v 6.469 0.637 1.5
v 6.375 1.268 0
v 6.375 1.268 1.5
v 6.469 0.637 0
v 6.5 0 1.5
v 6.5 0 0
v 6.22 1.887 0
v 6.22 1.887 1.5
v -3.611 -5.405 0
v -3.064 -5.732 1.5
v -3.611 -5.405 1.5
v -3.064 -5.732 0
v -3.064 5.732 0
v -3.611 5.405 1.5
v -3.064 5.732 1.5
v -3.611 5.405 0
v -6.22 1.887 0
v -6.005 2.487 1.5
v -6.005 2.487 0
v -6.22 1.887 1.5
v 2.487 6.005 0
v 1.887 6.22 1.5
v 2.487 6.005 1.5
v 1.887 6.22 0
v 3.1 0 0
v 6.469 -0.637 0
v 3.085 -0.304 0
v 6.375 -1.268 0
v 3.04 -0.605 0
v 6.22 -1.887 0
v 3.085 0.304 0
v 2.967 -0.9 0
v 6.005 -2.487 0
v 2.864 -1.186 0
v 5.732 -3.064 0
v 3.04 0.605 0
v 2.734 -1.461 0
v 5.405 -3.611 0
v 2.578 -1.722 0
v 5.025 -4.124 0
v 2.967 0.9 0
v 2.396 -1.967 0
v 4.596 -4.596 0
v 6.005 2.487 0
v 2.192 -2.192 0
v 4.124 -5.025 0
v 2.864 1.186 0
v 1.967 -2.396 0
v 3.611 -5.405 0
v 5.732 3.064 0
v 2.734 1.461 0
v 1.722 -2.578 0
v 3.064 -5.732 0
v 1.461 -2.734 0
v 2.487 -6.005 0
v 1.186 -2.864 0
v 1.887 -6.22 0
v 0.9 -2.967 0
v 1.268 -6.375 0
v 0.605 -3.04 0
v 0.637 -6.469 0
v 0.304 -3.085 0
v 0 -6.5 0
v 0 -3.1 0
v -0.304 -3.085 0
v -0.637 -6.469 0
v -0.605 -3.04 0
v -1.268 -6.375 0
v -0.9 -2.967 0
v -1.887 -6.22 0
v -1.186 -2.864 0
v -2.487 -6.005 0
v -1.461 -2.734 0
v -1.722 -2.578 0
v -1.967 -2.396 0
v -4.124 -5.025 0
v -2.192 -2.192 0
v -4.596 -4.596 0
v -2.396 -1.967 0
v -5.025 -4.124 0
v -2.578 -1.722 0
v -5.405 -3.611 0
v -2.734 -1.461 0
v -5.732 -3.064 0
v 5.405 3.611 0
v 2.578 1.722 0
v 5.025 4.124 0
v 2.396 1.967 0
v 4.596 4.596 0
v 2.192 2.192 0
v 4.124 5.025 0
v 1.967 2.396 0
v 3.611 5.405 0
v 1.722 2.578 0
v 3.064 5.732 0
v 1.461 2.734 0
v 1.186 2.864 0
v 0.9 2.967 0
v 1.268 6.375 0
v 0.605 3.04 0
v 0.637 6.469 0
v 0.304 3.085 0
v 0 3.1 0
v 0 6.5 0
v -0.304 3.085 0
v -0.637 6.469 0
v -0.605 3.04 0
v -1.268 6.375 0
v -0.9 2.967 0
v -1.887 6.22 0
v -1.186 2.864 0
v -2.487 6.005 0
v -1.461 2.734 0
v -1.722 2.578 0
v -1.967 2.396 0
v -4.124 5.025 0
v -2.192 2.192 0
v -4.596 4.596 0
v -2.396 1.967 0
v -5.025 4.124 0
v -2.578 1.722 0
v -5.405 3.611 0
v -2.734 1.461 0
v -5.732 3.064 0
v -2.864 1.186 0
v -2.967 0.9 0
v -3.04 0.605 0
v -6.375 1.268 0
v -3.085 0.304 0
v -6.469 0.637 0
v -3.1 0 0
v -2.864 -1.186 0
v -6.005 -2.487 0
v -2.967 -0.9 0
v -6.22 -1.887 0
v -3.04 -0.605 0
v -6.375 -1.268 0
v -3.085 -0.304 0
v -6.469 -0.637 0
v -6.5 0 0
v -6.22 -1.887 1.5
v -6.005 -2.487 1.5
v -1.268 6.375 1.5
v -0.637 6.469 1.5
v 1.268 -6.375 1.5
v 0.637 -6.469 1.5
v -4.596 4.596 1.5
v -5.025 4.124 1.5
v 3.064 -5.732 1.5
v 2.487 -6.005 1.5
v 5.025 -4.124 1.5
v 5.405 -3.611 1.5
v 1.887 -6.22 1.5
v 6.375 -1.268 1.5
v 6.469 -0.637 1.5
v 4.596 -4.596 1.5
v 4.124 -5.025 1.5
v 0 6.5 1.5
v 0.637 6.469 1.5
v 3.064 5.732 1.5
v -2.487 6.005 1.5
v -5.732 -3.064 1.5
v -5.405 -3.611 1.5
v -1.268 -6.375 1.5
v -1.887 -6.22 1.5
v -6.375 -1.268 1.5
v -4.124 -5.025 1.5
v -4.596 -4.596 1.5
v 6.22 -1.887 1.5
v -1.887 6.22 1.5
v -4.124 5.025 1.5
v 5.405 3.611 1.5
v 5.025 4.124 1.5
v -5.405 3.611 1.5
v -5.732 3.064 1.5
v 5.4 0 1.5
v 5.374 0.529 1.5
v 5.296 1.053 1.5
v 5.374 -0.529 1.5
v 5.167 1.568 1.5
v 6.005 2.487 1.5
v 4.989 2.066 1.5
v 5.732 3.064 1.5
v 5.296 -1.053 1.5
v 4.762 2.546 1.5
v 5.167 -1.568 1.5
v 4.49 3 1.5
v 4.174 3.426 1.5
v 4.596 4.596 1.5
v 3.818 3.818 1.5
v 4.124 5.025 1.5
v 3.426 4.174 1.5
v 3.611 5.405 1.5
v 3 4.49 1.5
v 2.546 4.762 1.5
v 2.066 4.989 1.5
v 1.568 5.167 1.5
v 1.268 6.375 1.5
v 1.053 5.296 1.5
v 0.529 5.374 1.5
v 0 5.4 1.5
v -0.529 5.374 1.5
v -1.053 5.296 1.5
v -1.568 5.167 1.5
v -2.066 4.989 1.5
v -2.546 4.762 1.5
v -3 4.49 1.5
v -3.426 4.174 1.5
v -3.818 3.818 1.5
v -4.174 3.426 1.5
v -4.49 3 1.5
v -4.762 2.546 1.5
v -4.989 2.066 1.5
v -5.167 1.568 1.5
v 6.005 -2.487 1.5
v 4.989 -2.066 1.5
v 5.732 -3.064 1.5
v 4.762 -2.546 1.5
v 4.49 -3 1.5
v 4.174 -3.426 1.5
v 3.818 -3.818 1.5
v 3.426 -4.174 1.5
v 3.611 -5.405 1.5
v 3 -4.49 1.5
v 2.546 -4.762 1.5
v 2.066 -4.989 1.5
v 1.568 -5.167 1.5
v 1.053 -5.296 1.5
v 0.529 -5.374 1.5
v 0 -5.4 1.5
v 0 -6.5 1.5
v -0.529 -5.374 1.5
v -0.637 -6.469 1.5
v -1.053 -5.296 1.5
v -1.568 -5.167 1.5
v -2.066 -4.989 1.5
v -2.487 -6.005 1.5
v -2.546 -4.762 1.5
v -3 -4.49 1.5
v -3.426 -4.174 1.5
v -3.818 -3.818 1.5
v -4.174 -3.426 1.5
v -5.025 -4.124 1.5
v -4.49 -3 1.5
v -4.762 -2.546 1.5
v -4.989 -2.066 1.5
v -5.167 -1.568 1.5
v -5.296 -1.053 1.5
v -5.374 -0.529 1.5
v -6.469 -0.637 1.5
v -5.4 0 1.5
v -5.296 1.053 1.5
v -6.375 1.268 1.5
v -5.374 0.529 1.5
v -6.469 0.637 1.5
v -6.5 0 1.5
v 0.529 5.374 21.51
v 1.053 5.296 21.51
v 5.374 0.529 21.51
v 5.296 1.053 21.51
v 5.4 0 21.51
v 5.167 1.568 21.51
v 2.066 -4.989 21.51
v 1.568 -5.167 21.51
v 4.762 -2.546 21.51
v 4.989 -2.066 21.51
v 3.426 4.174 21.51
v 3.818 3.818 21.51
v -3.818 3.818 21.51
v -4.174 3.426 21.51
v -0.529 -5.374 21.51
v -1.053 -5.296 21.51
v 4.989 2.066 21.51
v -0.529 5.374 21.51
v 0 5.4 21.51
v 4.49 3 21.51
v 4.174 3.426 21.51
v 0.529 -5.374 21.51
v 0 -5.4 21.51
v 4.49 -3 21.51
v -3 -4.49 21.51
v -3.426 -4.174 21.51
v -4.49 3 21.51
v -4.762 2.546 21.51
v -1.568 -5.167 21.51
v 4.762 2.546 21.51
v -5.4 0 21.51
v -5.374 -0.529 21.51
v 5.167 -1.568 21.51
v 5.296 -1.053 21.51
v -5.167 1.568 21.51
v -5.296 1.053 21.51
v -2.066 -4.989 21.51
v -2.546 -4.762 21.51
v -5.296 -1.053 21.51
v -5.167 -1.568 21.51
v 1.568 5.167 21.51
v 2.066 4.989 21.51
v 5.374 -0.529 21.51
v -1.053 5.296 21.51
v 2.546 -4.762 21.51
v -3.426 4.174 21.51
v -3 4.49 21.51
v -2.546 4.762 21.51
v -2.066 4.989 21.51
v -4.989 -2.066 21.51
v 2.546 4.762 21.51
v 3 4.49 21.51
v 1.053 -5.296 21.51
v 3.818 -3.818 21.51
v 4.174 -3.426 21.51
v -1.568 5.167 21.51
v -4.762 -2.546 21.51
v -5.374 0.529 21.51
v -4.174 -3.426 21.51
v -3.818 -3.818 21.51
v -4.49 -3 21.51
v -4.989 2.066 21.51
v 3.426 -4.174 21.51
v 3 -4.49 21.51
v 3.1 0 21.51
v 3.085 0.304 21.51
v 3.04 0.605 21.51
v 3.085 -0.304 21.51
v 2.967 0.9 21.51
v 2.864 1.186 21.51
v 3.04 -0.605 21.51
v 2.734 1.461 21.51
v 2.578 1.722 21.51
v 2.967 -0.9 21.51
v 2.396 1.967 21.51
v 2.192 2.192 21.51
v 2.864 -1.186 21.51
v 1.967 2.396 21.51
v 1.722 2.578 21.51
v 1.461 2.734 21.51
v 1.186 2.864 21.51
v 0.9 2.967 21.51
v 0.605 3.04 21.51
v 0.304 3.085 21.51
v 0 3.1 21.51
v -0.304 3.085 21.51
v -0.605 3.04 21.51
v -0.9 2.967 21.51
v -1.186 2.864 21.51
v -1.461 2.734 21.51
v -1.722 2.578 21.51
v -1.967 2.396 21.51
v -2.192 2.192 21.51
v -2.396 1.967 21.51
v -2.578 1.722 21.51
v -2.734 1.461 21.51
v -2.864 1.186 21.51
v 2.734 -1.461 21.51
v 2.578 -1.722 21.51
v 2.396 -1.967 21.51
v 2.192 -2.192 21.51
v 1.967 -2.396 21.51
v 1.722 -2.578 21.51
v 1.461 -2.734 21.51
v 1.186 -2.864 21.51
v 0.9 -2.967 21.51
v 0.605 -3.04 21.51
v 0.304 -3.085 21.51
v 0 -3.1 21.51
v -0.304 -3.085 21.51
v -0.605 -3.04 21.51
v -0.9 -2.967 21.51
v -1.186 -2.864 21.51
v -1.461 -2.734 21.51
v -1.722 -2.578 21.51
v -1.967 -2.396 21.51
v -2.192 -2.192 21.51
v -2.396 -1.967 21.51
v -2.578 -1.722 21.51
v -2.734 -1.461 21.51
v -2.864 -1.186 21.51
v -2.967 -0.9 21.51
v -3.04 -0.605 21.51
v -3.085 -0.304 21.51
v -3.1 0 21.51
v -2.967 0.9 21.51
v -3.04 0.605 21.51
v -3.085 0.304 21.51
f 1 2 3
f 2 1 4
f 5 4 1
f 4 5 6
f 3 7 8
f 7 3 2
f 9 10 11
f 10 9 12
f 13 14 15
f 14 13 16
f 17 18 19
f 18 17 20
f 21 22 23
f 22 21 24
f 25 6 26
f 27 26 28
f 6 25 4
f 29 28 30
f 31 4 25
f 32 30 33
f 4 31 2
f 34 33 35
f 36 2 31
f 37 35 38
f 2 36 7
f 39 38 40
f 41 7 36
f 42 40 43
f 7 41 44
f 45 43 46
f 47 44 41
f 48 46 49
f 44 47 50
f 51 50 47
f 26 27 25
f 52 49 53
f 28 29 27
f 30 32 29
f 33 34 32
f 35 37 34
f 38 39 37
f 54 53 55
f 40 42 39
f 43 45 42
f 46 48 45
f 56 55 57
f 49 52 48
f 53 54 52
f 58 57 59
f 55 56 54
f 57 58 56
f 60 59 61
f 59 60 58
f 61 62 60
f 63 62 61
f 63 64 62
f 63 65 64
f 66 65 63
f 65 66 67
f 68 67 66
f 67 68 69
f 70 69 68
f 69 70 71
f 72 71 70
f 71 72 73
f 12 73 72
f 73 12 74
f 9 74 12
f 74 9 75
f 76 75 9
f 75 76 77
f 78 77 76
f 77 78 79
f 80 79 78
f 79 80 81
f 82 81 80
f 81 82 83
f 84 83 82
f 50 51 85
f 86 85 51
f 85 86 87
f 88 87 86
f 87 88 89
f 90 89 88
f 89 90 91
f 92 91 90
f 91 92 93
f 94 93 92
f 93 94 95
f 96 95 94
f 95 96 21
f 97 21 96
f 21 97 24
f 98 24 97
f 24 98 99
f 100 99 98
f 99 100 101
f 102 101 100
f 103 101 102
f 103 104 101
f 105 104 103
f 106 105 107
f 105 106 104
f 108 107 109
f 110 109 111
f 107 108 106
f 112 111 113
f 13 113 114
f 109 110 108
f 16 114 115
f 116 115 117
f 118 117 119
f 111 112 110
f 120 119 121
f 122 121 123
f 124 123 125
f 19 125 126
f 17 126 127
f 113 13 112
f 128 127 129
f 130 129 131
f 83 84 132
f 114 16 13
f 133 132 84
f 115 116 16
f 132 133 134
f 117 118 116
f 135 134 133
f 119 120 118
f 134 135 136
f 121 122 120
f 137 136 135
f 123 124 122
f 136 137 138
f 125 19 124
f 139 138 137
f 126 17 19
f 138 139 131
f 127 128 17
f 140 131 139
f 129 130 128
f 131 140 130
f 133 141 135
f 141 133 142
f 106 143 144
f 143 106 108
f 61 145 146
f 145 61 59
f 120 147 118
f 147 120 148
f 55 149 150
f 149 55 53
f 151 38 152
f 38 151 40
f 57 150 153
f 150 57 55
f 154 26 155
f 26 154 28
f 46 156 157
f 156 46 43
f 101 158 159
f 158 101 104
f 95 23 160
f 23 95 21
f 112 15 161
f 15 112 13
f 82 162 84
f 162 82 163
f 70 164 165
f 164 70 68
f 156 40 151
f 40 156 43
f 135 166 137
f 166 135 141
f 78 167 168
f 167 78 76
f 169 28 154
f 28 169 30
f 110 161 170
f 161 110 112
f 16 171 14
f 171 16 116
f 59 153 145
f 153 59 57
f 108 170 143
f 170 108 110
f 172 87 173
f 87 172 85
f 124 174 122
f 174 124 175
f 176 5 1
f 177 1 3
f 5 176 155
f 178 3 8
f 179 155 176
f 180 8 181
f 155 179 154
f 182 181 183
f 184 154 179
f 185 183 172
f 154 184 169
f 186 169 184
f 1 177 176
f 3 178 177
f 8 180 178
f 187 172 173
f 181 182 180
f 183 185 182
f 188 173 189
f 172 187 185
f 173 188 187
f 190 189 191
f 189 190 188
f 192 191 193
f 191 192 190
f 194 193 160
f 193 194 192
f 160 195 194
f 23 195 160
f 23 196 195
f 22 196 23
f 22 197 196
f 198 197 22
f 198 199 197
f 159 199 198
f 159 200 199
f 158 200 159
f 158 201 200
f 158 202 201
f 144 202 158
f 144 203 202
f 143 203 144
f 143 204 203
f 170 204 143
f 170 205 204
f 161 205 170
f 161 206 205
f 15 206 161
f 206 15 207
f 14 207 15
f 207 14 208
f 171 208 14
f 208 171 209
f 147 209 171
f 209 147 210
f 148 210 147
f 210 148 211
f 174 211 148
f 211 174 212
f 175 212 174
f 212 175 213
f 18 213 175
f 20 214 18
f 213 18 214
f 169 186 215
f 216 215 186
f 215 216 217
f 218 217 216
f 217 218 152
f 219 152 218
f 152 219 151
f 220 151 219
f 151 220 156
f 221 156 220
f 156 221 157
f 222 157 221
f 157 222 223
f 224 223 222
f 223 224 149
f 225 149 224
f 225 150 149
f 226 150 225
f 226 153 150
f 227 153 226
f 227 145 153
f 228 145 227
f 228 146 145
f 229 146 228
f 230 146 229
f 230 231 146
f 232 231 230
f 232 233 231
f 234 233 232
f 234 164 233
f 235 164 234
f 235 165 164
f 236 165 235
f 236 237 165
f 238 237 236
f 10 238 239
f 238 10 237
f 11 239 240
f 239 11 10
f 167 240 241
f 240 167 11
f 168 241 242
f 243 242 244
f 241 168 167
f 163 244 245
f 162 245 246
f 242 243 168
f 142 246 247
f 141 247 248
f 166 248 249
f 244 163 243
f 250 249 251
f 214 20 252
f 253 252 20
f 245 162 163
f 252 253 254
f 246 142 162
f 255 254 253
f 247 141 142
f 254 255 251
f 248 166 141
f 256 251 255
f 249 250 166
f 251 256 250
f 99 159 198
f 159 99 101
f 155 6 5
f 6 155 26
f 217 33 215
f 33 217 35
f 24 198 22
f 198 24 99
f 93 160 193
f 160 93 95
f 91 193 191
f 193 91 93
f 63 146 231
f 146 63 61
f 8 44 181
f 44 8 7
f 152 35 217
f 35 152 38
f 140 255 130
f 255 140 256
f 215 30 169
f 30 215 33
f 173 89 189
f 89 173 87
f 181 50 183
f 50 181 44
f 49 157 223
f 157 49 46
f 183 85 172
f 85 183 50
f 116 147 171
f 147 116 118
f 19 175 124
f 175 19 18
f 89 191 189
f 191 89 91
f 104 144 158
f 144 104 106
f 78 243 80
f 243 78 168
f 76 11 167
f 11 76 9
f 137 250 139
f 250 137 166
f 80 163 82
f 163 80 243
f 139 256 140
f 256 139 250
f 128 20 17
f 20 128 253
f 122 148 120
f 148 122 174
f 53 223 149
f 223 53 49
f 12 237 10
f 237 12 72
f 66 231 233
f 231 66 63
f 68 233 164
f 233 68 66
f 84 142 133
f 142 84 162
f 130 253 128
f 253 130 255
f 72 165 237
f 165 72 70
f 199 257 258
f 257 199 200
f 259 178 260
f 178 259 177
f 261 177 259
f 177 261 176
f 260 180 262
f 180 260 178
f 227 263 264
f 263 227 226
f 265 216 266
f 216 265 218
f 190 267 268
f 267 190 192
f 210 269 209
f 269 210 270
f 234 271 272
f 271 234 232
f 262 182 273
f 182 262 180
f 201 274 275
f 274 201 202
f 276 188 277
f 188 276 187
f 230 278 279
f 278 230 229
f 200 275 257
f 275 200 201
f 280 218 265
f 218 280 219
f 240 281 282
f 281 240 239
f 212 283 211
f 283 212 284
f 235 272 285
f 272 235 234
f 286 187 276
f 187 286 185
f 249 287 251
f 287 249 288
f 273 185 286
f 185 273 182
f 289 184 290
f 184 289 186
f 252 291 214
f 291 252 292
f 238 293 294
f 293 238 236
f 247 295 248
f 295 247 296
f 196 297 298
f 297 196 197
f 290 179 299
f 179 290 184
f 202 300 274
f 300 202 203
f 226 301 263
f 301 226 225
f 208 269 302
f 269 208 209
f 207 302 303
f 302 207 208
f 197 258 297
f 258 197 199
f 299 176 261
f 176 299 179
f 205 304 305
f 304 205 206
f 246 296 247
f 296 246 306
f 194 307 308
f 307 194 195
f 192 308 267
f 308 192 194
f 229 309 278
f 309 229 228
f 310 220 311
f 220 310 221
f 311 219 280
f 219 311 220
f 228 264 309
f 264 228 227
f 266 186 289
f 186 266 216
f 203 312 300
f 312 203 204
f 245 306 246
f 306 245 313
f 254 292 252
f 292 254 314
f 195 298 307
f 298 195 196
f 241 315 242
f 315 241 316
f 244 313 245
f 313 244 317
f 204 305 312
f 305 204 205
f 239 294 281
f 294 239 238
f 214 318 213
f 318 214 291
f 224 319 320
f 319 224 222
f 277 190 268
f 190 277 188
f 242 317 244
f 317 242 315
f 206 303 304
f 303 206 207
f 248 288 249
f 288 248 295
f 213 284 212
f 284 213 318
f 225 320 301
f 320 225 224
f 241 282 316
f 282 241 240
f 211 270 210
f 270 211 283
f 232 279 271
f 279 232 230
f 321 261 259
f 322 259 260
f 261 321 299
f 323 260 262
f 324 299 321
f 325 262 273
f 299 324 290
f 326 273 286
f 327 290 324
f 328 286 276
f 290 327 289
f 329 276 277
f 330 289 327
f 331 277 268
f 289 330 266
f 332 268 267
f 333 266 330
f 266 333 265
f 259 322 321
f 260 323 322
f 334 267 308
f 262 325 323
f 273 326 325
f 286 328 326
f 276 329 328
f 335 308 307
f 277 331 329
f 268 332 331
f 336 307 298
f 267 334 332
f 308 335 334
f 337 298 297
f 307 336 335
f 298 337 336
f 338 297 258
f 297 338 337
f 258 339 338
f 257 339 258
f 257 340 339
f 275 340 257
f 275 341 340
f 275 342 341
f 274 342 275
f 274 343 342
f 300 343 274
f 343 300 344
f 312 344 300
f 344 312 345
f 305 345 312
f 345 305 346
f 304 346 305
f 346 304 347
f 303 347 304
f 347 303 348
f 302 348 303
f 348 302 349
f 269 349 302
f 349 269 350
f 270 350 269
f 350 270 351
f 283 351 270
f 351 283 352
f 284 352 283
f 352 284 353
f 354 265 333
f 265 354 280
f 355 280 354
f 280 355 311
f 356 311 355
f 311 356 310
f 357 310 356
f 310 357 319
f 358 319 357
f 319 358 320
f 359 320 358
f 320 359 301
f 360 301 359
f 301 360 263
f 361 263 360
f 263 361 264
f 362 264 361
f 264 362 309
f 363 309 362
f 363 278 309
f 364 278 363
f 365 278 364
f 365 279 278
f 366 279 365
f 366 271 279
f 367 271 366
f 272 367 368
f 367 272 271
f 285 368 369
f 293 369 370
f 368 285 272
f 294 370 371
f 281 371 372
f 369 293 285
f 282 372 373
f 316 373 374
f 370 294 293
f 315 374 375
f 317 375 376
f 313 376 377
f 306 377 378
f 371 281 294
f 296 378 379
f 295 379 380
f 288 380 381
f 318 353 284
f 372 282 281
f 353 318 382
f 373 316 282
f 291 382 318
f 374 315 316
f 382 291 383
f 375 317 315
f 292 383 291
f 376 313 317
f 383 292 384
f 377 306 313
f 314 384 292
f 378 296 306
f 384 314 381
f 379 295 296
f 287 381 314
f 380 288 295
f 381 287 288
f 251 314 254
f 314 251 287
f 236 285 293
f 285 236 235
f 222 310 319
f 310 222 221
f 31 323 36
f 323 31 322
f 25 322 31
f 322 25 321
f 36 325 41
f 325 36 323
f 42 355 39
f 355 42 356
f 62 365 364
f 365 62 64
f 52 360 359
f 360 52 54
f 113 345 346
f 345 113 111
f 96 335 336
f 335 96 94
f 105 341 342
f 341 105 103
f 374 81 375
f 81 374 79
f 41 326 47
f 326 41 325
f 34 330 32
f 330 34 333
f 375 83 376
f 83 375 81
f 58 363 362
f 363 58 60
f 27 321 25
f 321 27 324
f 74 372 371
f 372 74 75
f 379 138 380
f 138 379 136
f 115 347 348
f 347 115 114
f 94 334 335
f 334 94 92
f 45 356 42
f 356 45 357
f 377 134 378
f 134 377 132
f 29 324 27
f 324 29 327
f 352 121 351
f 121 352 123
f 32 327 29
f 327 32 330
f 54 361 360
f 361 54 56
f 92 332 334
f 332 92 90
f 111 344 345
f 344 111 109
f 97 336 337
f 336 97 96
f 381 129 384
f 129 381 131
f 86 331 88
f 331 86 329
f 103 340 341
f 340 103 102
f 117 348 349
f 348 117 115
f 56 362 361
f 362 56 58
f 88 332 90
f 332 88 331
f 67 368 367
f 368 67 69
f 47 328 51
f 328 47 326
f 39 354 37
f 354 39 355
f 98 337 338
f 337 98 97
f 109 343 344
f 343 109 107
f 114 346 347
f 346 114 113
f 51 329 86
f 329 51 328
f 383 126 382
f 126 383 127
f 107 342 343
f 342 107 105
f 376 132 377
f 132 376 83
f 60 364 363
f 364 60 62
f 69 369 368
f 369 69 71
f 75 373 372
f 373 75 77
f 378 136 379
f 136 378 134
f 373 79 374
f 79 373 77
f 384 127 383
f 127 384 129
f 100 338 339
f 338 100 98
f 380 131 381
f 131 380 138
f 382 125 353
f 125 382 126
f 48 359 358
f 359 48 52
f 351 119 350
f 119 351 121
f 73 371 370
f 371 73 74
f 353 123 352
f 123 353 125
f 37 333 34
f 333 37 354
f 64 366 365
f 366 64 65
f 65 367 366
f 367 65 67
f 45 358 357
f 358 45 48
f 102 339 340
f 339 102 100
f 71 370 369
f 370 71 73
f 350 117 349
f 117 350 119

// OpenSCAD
// Adapter sleeve: 0.2 mL PCR tube for a 1.5 mL tube rack hole
// Print orientation: collar on the bed (z = 0), sleeve body upward

$fn = 64;

// ---- Dimensions (mm) ----
collar_d      = 13;    // collar outer diameter
collar_h      = 1.5;   // collar thickness (z = 0 to 1.5)
sleeve_od     = 10.8;  // sleeve body outer diameter
sleeve_top_z  = 21.5;  // top of sleeve body (z)
bore_d        = 6.2;   // through-bore diameter
eps           = 0.5;   // cutter overshoot past faces

total_h = sleeve_top_z + 0.01; // ensure full height coverage

difference() {
    union() {
        // Collar
        cylinder(d = collar_d, h = collar_h);
        // Sleeve body (slightly overlapping collar for a clean union)
        translate([0, 0, collar_h - 0.01])
            cylinder(d = sleeve_od, h = total_h - collar_h + 0.01);
    }
    // Straight through-bore
    translate([0, 0, -eps])
        cylinder(d = bore_d, h = total_h + 2 * eps);
}
